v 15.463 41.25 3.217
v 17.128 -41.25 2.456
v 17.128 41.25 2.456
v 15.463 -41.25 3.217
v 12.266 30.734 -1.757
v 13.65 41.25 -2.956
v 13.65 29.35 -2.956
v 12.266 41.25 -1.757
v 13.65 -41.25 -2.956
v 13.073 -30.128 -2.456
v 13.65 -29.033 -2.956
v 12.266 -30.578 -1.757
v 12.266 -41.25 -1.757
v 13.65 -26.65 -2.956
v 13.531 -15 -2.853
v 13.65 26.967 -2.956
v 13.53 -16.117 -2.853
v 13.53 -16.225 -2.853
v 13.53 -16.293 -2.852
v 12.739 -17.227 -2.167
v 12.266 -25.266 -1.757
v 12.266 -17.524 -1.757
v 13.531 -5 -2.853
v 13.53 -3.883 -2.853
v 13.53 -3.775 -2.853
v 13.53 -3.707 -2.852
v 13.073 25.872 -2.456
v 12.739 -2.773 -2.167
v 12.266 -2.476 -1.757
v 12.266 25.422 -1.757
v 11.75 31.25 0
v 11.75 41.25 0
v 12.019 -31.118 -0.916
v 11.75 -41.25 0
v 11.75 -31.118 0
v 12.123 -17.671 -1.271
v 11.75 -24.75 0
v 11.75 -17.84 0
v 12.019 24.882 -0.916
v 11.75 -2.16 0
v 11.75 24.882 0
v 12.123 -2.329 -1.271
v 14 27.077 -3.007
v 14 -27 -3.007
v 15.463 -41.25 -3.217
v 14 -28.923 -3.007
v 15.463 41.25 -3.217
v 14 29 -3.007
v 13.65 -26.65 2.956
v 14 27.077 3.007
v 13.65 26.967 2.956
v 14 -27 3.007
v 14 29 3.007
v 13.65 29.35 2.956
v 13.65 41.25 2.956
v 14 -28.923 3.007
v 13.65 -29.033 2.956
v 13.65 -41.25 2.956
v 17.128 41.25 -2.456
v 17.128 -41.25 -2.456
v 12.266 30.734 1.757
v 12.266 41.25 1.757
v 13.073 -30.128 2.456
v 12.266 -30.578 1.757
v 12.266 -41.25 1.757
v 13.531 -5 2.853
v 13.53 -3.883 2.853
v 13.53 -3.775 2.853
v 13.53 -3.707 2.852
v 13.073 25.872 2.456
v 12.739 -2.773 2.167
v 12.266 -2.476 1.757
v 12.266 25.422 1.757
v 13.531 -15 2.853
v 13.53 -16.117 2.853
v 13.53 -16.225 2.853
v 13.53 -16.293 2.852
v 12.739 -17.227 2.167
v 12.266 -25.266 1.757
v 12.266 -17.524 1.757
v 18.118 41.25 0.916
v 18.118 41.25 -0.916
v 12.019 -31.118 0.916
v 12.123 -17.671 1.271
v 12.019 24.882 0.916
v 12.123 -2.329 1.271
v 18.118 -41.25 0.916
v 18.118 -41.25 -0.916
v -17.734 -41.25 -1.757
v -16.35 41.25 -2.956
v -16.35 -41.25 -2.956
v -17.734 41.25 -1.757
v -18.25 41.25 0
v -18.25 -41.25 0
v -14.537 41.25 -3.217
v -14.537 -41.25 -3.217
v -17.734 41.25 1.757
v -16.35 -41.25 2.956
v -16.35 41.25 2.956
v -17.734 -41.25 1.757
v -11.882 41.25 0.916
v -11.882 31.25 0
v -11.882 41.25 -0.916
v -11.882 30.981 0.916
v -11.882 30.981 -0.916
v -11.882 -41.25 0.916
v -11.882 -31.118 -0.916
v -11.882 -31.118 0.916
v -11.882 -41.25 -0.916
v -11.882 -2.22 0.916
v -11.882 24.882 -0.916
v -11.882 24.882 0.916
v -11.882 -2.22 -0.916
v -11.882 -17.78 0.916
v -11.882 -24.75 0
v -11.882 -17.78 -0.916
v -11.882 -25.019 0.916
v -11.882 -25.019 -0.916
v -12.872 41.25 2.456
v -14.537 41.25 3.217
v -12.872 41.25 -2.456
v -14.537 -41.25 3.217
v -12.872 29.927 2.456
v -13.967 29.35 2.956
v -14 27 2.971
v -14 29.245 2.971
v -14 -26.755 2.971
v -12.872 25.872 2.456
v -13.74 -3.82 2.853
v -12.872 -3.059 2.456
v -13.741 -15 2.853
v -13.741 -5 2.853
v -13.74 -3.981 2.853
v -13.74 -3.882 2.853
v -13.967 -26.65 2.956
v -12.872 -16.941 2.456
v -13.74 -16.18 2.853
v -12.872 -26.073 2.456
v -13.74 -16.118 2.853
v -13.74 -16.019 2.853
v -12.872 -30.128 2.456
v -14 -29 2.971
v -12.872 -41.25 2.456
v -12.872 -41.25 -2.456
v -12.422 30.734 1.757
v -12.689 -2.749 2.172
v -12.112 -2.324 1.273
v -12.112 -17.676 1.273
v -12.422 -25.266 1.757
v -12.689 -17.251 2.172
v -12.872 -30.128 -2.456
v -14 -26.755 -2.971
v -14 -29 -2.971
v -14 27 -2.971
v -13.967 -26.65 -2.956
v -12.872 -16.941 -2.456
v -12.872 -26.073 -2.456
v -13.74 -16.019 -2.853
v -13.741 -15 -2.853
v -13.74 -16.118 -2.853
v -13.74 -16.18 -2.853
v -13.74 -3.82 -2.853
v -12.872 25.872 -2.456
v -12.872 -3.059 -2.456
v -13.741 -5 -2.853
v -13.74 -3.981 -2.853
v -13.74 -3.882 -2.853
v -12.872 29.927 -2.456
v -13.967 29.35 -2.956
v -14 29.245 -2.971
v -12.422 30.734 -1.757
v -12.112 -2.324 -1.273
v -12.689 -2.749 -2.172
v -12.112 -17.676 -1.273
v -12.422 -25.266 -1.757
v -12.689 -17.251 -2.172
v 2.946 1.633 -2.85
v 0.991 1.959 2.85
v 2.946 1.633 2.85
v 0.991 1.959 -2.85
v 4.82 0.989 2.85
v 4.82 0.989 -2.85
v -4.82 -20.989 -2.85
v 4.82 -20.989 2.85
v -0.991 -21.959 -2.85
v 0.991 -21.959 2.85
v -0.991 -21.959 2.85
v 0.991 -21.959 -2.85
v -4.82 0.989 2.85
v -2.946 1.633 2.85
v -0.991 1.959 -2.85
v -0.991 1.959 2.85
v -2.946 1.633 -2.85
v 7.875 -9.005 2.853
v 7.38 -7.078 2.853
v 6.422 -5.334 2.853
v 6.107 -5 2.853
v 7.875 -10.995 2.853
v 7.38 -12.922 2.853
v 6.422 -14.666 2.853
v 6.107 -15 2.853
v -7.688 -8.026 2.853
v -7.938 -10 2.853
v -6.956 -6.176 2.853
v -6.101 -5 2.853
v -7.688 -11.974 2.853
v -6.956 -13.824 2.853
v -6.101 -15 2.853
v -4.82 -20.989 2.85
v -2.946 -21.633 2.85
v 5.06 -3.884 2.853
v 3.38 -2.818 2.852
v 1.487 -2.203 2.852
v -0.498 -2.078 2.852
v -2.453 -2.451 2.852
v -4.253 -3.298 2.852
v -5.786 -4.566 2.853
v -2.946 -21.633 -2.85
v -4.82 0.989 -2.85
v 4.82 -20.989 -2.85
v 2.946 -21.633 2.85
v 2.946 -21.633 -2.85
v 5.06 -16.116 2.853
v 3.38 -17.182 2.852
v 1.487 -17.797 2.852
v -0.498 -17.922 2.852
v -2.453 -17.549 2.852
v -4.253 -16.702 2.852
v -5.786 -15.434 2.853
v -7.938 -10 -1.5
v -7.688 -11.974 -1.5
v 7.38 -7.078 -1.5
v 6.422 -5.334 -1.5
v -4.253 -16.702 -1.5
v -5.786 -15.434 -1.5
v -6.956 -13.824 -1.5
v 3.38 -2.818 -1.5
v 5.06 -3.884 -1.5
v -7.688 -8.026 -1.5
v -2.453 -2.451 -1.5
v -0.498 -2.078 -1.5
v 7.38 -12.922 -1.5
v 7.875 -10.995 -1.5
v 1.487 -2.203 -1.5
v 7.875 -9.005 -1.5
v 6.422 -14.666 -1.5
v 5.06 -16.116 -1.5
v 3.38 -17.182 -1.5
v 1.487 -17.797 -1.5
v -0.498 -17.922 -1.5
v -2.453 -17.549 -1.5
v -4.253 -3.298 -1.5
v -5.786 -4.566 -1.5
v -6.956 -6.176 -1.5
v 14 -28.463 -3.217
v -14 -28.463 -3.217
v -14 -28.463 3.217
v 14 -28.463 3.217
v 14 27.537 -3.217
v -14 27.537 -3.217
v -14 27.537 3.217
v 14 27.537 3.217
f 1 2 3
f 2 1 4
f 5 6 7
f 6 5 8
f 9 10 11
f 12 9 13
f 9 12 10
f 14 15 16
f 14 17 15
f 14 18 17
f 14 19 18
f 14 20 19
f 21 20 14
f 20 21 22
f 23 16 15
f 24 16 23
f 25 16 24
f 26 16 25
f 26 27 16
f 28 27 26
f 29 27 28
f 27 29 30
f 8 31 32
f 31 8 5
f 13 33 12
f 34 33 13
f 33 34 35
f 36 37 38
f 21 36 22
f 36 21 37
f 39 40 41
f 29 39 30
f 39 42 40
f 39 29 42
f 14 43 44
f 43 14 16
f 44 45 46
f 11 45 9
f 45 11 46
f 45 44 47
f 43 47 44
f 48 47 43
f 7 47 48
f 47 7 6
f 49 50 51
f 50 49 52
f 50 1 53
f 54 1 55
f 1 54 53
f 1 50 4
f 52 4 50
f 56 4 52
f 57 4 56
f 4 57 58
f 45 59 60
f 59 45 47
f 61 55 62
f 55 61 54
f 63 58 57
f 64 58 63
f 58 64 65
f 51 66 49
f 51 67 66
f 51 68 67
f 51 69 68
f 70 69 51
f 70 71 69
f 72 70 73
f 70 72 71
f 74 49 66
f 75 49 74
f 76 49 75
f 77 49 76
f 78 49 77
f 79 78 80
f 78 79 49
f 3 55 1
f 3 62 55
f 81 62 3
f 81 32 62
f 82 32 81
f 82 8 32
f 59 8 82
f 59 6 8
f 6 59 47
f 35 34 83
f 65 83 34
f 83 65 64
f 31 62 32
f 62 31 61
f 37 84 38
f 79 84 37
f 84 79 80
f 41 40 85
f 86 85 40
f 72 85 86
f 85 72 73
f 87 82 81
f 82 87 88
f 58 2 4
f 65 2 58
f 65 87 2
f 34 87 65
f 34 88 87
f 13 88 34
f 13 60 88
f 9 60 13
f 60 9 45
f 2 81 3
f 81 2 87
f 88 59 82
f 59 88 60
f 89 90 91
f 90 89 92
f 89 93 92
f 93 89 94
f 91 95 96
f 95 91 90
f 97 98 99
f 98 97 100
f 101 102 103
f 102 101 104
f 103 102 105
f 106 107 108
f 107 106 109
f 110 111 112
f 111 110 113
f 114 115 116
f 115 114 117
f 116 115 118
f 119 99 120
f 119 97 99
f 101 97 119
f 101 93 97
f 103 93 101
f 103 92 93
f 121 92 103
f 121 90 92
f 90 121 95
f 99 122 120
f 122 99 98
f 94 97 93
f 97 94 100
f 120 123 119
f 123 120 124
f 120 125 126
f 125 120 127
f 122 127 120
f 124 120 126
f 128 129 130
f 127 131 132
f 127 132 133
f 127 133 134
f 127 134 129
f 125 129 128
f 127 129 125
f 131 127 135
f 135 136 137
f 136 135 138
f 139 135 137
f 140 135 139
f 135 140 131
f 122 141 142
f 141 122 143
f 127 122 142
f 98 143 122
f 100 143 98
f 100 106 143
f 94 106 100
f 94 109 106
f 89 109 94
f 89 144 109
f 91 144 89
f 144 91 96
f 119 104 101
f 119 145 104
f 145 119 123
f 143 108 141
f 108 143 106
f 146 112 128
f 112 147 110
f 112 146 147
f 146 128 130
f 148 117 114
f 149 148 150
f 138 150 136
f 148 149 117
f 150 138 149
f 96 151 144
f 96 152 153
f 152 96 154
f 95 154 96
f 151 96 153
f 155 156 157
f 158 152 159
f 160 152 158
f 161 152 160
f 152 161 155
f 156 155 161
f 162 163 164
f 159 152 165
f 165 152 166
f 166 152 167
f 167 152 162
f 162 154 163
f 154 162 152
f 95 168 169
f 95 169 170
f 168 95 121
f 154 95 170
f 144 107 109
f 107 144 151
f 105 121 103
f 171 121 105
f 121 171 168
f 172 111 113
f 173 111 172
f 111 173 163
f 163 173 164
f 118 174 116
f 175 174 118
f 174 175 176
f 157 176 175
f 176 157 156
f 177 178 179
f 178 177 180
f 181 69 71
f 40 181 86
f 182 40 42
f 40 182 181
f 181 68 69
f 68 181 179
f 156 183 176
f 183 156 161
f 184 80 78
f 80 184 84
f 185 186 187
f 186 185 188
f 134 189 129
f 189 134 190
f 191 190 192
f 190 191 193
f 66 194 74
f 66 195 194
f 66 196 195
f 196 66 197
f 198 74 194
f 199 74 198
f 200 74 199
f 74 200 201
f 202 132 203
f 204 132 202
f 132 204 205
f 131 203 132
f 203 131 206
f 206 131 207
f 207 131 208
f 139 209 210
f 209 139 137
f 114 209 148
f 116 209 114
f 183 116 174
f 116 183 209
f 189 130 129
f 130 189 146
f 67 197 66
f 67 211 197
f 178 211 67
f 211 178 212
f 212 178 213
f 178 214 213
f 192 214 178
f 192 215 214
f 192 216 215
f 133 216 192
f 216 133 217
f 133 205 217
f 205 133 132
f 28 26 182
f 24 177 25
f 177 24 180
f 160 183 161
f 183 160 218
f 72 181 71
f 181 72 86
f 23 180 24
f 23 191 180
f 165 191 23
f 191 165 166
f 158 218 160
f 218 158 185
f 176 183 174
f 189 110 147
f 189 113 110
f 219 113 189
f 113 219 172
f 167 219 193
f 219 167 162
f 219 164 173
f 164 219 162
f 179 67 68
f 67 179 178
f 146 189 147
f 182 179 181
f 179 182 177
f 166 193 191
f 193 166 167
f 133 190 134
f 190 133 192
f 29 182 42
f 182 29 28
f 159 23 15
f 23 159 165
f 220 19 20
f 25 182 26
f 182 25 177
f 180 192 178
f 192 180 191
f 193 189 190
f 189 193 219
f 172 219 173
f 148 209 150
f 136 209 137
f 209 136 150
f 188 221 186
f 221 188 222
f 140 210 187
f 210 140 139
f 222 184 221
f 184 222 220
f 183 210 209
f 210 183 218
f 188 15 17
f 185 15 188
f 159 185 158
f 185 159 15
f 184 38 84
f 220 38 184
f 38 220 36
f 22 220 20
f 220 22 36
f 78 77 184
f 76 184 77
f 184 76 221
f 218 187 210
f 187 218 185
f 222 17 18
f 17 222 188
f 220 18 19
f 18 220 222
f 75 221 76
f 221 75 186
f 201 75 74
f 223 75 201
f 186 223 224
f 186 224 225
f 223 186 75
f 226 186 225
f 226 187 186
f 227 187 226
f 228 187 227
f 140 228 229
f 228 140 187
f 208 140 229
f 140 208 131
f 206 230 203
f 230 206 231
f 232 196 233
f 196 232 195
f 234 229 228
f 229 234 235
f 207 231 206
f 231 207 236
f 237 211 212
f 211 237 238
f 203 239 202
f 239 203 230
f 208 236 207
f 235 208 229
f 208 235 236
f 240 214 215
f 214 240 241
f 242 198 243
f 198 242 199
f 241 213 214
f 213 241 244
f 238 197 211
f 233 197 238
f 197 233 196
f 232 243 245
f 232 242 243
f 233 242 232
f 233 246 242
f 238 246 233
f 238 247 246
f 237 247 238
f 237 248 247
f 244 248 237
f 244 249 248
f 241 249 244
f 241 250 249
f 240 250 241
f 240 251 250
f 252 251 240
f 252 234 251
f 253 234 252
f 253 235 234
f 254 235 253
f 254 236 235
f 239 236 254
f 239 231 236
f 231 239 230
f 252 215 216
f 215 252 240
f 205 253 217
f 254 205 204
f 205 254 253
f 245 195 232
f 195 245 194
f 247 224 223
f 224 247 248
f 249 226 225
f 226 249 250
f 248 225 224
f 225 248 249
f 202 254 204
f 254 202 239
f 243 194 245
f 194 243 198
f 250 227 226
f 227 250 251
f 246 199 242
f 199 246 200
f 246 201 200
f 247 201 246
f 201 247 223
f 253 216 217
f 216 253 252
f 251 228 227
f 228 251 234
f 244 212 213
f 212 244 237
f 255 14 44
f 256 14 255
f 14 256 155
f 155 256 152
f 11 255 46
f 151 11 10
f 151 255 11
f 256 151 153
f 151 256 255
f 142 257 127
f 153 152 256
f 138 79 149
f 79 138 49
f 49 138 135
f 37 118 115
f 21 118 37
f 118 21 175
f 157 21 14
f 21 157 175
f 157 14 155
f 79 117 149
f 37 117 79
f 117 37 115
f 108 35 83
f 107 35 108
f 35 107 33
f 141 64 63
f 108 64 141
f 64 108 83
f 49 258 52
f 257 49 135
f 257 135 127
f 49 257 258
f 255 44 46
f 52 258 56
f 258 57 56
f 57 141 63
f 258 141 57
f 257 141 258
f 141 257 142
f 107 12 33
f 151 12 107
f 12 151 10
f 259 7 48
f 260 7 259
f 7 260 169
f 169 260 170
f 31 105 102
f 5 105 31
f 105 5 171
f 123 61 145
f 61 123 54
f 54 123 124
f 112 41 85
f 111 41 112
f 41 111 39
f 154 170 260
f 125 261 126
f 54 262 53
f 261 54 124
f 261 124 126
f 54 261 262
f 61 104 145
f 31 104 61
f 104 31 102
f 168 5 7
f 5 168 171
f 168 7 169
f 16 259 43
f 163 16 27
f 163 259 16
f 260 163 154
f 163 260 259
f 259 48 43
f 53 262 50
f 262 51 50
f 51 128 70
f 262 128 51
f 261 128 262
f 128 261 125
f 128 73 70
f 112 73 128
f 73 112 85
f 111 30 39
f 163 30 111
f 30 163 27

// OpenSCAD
// file: shockMountEnd2.scad
use <MCAD/triangles.scad>

$fa=0.01;
$fs=0.5;

ringw=10;
angle=40;

module nt55() {
	cylinder(r=10,h=145,center=true);
}

module se2a() {
	cylinder(r=11,h=162,center=true);
}

module ring() {
	difference() {
		union() {
			difference() {
				cylinder(r=35,h=ringw,center=true);
				cylinder(r=27,h=ringw+2,center=true);
				translate([0,-29,0]) {
					cube([72,20,ringw+2],center=true);
				}
			}
			
			translate([0,-14.,0]) {
				cube([58.5,10,ringw],center=true);
			}
		}
	}
}

module innerNotches() {
	intersection() {
		difference() {
			color([0,1,1])
			cylinder(r=27.75,h=1.5,center=true);
			
			color([0,1,1])
			cylinder(r=26.5,h=2.5,center=true);
		
			translate([0,-19.1,0]) {
				cube([58.5,20,ringw],center=true);
			}
			topNotch();
		}
		
		translate([0,6.5,0]) {
			rotate([0,0,20])
			cube([75,10.5,1.5],center=true);
			rotate([0,0,-20])
			cube([75,10.5,1.5],center=true);
		}
	}
}

module notchset() {
	difference() {
		union() {
			translate([0,5,1])
				cube([75,1.5,10],center=true);
			translate([0,-5,1])
				cube([75,1.5,10],center=true);
	
			translate([0,5,-3.5])
			rotate([0,90,0])
				cylinder(r=1.5,h=100,center=true);
			translate([0,-5,-3.5])
			rotate([0,90,0])
				cylinder(r=1.5,h=100,center=true);
		}
		
		union() {
			translate([0,5,0])
				cube([43,5,5],center=true);
			translate([0,-5,0])
				cube([43,5,5],center=true);
		}
	}
}

module notches() {		
	color([0,0,1])
	translate([-2,6,5])
	rotate([0,0,20])
		notchset(); 
	color([0,1,0])
	translate([2,6,5])
	rotate([0,0,-20])
		notchset();
}

module topNotch() {
	union() {
		translate([0,40,-7])
		rotate([0,0,-90])
			a_triangle(angle/2,40,14);
		translate([0,40,7])
		rotate([0,180,-270])
			a_triangle(angle/2,40,14);		
		translate([0,31,0])
			cube([1,10,14],center=true);
	}
}

module shockMountEnd() {
	difference() {
		ring();
		topNotch();
		notches();
		translate([0,0,1])
			innerNotches();
		translate([-15,-14,0])
		cylinder(r=3.45,h=15,center=true);
		translate([15,-14,0])
		cylinder(r=3.45,h=15,center=true);
	}
}

//translate([0,6,0])
//nt55();

shockMountEnd();
// main file
use <shockMountEnd2.scad>

$fa=0.01;
$f =0.5;


module shockmountJoin() {
	union() {
		translate([-15,0,0])
		cylinder(r=3.25,h=82.5,center=true);
		translate([15,0,0])
		cylinder(r=3.25,h=82.5,center=true);
	}
	
	translate([0,0,28])
	rotate([0,90,0])
	cylinder(r=3.25,h=28,center=true);
	translate([0,0,-28])
	rotate([0,90,0])
	cylinder(r=3.25,h=28,center=true);

	difference() {	
		hull() {
			translate([0,0,10])
			rotate([90,0,0])
			cylinder(r=12,h=5.7,center=true);
			
			union() {
				translate([-15,0,10])
				cylinder(r=3,h=10,center=true);
				translate([15,0,10])
				cylinder(r=3,h=10,center=true);
			}
		}
		
		translate([0,1.5,10])
		rotate([90,0,0])
		cylinder(r=7.9375,h=10);
	}
}

//translate([0,14,36.25])
//shockMountEnd();
//translate([0,14,-36.25])
//shockMountEnd();

//rotate([0,0,0])
//nt55();

rotate([90,180,0])
shockmountJoin();
